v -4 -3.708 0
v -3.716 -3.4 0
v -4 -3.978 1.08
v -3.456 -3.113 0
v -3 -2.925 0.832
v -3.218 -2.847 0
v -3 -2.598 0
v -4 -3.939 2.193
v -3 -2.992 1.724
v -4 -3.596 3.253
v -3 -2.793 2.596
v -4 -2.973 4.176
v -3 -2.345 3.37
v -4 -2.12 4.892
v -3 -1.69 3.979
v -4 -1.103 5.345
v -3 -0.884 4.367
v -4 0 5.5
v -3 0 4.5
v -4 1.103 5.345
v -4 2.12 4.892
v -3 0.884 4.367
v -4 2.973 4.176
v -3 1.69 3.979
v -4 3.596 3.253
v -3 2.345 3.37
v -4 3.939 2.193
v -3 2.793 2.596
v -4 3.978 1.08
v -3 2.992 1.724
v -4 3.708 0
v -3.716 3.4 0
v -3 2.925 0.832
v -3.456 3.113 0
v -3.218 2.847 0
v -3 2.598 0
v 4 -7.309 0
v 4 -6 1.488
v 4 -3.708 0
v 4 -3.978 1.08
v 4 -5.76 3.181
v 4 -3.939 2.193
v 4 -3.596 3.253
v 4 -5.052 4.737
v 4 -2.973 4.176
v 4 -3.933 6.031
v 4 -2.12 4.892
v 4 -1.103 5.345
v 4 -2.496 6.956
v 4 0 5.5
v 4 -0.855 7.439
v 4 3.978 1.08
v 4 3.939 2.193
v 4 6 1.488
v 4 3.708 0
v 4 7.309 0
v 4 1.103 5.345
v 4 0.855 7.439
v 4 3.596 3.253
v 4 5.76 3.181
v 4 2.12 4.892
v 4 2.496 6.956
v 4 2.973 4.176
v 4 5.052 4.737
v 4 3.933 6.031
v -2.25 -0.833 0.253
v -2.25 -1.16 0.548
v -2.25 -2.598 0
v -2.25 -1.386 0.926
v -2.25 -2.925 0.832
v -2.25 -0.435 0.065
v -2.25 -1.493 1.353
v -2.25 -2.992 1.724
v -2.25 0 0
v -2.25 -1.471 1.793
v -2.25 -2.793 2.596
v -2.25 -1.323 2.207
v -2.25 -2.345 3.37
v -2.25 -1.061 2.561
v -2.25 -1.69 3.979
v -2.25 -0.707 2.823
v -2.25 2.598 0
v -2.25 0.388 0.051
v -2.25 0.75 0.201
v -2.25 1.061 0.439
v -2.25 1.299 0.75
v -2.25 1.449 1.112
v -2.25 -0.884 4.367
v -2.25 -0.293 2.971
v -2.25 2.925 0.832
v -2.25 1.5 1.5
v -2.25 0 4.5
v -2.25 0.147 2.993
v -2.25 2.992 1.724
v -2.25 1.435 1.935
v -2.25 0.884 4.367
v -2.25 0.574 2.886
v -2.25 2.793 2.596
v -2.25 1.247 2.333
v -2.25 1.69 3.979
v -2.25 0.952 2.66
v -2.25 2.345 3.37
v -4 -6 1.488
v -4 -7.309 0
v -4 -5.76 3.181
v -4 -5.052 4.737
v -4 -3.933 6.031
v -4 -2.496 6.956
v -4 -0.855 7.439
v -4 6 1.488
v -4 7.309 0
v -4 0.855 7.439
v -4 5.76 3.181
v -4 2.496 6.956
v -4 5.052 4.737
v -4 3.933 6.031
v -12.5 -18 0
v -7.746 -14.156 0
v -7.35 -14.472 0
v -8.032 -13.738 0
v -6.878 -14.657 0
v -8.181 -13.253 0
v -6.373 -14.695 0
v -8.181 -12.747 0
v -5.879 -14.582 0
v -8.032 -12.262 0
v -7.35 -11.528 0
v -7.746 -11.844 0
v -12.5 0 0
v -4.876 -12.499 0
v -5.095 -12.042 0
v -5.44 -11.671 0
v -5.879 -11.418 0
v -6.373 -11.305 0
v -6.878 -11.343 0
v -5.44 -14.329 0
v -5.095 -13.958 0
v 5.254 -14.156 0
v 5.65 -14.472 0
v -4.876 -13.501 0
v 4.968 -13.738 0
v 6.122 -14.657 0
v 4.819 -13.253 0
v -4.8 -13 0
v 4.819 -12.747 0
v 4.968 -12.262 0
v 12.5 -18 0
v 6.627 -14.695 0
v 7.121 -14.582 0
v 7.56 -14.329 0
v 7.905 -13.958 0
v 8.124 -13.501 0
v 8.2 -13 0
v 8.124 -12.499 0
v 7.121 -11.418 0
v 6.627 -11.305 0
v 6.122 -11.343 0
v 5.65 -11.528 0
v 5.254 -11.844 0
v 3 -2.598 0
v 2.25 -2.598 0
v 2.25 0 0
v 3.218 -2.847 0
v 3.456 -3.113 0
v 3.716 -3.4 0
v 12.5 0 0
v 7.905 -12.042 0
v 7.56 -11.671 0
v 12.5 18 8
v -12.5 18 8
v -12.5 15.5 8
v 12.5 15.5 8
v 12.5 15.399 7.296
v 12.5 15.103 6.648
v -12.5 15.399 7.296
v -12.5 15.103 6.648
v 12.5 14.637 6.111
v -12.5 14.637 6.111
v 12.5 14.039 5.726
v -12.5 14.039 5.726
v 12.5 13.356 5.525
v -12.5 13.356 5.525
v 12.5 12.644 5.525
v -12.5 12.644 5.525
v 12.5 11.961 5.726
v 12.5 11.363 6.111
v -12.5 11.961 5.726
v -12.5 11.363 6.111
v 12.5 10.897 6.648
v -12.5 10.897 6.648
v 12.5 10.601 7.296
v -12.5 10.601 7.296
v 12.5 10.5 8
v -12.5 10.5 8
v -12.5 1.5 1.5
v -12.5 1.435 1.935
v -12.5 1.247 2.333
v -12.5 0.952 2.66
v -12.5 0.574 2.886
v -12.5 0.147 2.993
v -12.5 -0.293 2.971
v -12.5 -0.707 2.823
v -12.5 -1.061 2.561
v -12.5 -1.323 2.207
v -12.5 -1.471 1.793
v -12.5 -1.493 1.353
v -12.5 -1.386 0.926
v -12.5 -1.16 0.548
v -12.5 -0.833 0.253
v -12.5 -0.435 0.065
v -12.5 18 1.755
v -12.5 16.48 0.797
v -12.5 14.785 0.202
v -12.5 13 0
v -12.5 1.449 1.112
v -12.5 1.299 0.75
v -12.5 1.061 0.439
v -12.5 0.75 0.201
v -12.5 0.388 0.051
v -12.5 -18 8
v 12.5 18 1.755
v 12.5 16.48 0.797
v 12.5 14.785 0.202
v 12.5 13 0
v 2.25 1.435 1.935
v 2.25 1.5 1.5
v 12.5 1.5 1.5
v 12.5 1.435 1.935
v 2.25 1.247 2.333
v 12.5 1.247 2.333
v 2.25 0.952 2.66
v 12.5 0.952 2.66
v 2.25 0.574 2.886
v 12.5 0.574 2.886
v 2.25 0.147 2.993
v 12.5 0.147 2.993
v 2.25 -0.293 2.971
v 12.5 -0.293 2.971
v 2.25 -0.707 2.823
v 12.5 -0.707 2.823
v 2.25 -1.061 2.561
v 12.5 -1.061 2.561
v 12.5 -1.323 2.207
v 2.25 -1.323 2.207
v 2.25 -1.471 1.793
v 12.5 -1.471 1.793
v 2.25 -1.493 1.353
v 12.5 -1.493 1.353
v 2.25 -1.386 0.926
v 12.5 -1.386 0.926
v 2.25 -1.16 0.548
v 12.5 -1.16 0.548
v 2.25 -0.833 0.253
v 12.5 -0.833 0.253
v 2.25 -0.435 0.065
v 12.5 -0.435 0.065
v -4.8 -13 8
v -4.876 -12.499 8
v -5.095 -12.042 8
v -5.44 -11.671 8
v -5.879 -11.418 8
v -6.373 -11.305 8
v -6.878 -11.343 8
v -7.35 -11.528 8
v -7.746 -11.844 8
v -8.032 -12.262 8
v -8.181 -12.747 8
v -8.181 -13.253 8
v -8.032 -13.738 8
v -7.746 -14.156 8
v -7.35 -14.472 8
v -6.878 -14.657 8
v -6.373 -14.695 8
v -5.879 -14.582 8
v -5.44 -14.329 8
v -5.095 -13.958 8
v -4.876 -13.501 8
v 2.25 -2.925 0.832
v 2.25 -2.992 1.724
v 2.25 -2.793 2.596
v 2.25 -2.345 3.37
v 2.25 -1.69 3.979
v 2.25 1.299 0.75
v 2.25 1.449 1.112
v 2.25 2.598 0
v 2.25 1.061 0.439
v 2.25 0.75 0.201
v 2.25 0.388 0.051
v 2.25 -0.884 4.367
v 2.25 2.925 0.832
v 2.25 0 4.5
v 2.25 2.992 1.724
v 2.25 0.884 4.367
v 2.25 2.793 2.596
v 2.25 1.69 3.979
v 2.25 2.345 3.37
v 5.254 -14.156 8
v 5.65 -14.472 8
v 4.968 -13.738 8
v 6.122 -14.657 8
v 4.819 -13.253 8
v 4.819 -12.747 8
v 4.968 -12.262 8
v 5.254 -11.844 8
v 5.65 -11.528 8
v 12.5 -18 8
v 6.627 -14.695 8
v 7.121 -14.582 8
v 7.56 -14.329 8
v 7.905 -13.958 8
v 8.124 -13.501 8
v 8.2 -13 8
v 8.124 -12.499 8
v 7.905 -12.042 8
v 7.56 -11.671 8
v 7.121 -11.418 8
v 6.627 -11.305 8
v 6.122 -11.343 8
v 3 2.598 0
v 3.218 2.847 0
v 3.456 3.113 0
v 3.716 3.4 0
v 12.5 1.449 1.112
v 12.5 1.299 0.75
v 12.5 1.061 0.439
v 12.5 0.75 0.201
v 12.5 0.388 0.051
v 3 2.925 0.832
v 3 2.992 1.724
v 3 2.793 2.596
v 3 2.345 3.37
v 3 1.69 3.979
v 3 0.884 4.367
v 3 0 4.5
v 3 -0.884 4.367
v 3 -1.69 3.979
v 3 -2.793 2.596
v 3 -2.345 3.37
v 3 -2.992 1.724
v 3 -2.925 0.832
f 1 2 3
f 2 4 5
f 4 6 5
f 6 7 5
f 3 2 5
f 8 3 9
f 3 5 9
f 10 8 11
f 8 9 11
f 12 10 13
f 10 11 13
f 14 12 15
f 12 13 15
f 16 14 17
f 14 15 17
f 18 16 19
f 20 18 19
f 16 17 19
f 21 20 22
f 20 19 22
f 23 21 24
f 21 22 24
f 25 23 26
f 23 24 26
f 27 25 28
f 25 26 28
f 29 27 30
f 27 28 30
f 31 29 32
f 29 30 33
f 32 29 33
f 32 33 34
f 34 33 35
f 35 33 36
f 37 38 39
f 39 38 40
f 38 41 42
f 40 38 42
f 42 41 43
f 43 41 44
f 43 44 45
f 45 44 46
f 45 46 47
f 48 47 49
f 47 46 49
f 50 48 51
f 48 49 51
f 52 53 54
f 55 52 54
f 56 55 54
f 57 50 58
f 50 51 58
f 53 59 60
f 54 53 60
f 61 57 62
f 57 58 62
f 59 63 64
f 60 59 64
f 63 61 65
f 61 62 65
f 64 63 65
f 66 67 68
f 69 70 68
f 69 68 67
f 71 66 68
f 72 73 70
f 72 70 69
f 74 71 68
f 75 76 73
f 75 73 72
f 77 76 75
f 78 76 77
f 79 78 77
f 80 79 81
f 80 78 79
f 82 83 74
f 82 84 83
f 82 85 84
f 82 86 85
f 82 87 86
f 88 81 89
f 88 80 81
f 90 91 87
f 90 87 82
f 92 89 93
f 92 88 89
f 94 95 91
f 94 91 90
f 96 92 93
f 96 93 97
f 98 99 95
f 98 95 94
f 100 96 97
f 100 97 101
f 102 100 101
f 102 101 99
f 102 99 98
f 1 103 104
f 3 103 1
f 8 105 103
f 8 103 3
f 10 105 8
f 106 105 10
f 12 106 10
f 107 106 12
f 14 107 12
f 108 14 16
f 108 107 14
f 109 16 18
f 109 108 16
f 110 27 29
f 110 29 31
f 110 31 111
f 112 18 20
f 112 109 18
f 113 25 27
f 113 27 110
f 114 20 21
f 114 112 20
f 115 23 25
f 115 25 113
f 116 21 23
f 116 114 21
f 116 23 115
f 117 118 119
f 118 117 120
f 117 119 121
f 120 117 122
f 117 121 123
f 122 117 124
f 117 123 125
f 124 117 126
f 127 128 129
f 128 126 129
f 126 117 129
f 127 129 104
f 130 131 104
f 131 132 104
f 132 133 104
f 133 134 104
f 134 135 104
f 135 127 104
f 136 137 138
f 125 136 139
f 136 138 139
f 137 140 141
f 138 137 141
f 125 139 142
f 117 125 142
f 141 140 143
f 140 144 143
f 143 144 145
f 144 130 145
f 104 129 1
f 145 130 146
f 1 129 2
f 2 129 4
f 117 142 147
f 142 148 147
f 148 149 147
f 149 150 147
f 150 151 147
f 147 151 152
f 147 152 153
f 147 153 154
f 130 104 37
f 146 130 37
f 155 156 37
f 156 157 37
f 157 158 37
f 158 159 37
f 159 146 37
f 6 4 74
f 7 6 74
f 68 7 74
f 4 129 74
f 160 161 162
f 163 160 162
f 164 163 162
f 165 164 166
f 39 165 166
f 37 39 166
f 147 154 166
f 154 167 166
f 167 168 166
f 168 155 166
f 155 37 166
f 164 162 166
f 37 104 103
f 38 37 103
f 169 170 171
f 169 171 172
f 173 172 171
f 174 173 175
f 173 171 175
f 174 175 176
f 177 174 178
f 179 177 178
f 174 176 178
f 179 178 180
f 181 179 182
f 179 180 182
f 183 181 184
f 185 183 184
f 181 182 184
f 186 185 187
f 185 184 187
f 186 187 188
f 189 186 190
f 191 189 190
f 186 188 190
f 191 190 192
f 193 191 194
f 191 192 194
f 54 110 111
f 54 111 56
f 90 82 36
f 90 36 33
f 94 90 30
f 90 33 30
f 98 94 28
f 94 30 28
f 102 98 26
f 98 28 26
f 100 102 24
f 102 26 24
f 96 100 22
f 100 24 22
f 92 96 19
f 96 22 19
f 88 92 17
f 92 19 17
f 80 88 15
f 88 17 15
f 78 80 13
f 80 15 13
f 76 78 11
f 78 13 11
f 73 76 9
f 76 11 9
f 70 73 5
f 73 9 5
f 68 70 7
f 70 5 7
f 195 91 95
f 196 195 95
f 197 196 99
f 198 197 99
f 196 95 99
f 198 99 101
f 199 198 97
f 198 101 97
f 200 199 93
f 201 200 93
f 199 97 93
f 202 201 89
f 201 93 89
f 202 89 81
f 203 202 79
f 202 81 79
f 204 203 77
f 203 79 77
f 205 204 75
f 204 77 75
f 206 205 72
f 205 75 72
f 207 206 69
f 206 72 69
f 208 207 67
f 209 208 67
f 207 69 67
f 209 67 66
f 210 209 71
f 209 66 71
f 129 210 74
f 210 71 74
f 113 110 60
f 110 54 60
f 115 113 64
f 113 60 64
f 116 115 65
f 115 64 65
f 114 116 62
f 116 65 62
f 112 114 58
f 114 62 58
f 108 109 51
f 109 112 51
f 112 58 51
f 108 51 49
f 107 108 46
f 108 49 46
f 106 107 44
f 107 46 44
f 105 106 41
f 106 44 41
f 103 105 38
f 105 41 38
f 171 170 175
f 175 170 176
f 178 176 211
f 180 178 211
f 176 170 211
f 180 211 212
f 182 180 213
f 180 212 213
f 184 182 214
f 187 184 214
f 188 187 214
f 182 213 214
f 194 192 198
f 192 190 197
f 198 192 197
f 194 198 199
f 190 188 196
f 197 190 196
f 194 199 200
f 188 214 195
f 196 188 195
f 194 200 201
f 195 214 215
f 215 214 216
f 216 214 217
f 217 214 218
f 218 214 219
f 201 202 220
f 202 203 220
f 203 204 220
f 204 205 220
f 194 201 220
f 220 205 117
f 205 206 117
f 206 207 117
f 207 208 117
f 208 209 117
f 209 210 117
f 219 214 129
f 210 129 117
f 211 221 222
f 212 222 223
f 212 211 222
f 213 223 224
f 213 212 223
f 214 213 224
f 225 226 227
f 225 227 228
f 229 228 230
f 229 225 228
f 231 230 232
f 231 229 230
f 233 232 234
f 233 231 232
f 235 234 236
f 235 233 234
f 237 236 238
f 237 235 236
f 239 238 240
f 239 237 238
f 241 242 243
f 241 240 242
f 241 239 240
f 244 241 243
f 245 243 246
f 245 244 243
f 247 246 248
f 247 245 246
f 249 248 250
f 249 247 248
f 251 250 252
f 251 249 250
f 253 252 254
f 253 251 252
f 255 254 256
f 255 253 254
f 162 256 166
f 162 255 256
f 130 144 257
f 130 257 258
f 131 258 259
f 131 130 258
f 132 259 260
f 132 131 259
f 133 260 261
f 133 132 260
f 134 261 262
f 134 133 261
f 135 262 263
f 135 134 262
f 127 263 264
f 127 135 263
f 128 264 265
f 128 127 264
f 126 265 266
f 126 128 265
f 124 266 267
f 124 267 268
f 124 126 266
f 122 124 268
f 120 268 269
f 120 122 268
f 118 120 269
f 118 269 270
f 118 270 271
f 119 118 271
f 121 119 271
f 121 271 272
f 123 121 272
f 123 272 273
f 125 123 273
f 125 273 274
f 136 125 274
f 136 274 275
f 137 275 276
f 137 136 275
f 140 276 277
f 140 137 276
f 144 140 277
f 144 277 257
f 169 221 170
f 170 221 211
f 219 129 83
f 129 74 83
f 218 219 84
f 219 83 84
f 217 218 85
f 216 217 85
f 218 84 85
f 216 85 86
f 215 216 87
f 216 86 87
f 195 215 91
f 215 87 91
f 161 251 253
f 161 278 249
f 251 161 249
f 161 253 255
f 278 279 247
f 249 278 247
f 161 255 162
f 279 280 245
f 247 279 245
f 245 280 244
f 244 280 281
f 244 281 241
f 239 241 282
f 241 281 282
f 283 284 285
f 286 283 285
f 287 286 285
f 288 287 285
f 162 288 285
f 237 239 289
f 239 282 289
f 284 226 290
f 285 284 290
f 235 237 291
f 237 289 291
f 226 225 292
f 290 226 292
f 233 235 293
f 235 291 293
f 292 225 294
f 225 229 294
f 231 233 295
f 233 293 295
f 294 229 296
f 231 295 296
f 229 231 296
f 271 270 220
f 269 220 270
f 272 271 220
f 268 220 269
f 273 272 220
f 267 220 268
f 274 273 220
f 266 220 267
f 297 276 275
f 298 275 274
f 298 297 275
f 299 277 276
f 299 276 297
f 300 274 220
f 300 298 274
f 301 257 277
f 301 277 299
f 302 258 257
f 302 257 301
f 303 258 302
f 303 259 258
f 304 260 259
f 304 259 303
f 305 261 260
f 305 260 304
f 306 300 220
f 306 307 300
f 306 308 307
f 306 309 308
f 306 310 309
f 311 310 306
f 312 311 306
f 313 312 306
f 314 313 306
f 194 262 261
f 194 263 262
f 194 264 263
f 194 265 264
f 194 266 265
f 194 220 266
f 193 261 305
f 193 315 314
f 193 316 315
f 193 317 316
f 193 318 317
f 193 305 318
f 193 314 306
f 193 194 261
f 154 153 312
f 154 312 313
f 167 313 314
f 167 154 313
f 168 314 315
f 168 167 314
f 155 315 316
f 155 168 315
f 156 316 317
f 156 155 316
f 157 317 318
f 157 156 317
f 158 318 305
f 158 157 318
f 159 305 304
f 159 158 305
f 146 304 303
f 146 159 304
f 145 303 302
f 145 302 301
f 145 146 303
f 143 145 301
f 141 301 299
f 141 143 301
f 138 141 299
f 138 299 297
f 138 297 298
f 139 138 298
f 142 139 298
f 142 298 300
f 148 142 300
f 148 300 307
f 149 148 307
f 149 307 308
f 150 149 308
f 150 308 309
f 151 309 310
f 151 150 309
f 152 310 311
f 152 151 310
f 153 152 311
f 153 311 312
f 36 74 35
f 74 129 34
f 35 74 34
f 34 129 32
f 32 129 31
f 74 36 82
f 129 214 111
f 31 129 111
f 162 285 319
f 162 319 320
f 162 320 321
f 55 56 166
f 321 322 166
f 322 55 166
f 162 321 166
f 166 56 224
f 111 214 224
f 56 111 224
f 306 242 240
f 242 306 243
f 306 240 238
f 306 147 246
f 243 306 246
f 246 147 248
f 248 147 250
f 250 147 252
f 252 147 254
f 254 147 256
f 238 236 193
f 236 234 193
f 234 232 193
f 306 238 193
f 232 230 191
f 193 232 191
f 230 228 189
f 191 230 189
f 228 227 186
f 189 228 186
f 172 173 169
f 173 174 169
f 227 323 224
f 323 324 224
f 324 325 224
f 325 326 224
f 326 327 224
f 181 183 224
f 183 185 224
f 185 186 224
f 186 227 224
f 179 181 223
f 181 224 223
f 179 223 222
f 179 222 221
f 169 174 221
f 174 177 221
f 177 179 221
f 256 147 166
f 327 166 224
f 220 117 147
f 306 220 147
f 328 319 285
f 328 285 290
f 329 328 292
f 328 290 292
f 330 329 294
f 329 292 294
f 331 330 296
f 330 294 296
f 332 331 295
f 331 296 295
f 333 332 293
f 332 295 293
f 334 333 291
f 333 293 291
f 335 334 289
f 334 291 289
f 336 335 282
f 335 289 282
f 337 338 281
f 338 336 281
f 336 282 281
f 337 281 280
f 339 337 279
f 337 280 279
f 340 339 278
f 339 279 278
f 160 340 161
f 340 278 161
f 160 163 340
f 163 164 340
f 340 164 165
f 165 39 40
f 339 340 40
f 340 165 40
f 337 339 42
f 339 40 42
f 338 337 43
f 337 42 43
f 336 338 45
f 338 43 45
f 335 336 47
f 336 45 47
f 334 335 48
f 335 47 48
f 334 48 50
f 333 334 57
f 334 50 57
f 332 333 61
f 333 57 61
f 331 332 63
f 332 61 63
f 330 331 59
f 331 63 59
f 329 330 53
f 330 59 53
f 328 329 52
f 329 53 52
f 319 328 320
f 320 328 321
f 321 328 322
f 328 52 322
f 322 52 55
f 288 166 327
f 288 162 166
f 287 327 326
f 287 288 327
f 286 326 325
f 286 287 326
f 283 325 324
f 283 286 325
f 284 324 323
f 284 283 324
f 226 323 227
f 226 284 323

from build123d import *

# Parameters (mm, degrees)
SKETCH_R          = 1.7
PAD_DEPTH         = 8
SKETCH001_R       = 1.5
POCKET_DEPTH      = 12.501
POCKET_DEPTH_BACK = -12.501
SKETCH002_R       = 3
POCKET001_DEPTH   = 2.25
SKETCH003_R       = 6
SKETCH003_R_2     = 3
POCKET002_DEPTH   = 4
SKETCH004_R       = 2.5
POCKET003_DEPTH   = 25.001
POCKET004_DEPTH   = 25.001
CHAMFER_SIZE      = 1
CHAMFER001_SIZE   = 1.5


with BuildPart() as part:
    # Sketch → Pad (new body)
    with BuildSketch(Plane.XY):
        Polygon((-12.5, 18), (-12.5, 0), (-12.5, -18), (0, -18), (12.5, -18), (12.5, 0), (12.5, 18), (0, 18), align=None)
        with Locations((6.5, -13)):
            Circle(SKETCH_R, mode=Mode.SUBTRACT)
        with Locations((-6.5, -13)):
            Circle(SKETCH_R, mode=Mode.SUBTRACT)
    extrude(amount=PAD_DEPTH)

    # Sketch001 → Pocket (cut, two sides)
    with BuildSketch(Plane.YZ) as pocket_sk:
        with Locations((0, 1.5)):
            Circle(SKETCH001_R)
    extrude(amount=-POCKET_DEPTH, mode=Mode.SUBTRACT)
    extrude(pocket_sk.sketch, amount=-POCKET_DEPTH_BACK, mode=Mode.SUBTRACT)

    # Sketch002 → Pocket001 (cut, symmetric)
    with BuildSketch(Plane.YZ):
        with Locations((0, 1.5)):
            Circle(SKETCH002_R)
    extrude(amount=POCKET001_DEPTH, both=True, mode=Mode.SUBTRACT)

    # Sketch003 → Pocket002 (cut, symmetric)
    with BuildSketch(Plane.YZ):
        with Locations((0, 1.5)):
            Circle(SKETCH003_R)
        with Locations((0, 1.5)):
            Circle(SKETCH003_R_2, mode=Mode.SUBTRACT)
    extrude(amount=POCKET002_DEPTH, both=True, mode=Mode.SUBTRACT)

    # Sketch004 (on DatumPlane) → Pocket003 (cut, through all)
    with BuildSketch(Plane(origin=(-12.5, 13, 8), x_dir=(0, -1, 0), z_dir=(-1, 0, 0))):
        Circle(SKETCH004_R)
    extrude(amount=-POCKET003_DEPTH, mode=Mode.SUBTRACT)

    # Sketch005 (on DatumPlane) → Pocket004 (cut, through all)
    with BuildSketch(Plane(origin=(-12.5, 13, 0), x_dir=(0, -1, 0), z_dir=(-1, 0, 0))):
        with BuildLine():
            ThreePointArc((-8, 8), (-5.656854, 2.343146), (0, 0))
            Line((0, 0), (0, -10))
            ThreePointArc((-18, 8), (-12.727922, -4.727922), (0, -10))
            Line((-8, 8), (-18, 8))
        make_face()
    extrude(amount=-POCKET004_DEPTH, mode=Mode.SUBTRACT)

    # Chamfer
    chamfer_edges = [part.edges().sort_by_distance(p)[0] for p in [
        (-4, -0.776457, 4.397777),
        (4, -0.776457, 4.397777),
    ]]
    chamfer(chamfer_edges, length=CHAMFER_SIZE)

    # Chamfer001
    chamfer001_edges = [part.edges().sort_by_distance(p)[0] for p in [
        (0, 5.809475, 0),
        (0, -5.809475, 0),
    ]]
    chamfer(chamfer001_edges, length=CHAMFER001_SIZE)


solid = part.part
